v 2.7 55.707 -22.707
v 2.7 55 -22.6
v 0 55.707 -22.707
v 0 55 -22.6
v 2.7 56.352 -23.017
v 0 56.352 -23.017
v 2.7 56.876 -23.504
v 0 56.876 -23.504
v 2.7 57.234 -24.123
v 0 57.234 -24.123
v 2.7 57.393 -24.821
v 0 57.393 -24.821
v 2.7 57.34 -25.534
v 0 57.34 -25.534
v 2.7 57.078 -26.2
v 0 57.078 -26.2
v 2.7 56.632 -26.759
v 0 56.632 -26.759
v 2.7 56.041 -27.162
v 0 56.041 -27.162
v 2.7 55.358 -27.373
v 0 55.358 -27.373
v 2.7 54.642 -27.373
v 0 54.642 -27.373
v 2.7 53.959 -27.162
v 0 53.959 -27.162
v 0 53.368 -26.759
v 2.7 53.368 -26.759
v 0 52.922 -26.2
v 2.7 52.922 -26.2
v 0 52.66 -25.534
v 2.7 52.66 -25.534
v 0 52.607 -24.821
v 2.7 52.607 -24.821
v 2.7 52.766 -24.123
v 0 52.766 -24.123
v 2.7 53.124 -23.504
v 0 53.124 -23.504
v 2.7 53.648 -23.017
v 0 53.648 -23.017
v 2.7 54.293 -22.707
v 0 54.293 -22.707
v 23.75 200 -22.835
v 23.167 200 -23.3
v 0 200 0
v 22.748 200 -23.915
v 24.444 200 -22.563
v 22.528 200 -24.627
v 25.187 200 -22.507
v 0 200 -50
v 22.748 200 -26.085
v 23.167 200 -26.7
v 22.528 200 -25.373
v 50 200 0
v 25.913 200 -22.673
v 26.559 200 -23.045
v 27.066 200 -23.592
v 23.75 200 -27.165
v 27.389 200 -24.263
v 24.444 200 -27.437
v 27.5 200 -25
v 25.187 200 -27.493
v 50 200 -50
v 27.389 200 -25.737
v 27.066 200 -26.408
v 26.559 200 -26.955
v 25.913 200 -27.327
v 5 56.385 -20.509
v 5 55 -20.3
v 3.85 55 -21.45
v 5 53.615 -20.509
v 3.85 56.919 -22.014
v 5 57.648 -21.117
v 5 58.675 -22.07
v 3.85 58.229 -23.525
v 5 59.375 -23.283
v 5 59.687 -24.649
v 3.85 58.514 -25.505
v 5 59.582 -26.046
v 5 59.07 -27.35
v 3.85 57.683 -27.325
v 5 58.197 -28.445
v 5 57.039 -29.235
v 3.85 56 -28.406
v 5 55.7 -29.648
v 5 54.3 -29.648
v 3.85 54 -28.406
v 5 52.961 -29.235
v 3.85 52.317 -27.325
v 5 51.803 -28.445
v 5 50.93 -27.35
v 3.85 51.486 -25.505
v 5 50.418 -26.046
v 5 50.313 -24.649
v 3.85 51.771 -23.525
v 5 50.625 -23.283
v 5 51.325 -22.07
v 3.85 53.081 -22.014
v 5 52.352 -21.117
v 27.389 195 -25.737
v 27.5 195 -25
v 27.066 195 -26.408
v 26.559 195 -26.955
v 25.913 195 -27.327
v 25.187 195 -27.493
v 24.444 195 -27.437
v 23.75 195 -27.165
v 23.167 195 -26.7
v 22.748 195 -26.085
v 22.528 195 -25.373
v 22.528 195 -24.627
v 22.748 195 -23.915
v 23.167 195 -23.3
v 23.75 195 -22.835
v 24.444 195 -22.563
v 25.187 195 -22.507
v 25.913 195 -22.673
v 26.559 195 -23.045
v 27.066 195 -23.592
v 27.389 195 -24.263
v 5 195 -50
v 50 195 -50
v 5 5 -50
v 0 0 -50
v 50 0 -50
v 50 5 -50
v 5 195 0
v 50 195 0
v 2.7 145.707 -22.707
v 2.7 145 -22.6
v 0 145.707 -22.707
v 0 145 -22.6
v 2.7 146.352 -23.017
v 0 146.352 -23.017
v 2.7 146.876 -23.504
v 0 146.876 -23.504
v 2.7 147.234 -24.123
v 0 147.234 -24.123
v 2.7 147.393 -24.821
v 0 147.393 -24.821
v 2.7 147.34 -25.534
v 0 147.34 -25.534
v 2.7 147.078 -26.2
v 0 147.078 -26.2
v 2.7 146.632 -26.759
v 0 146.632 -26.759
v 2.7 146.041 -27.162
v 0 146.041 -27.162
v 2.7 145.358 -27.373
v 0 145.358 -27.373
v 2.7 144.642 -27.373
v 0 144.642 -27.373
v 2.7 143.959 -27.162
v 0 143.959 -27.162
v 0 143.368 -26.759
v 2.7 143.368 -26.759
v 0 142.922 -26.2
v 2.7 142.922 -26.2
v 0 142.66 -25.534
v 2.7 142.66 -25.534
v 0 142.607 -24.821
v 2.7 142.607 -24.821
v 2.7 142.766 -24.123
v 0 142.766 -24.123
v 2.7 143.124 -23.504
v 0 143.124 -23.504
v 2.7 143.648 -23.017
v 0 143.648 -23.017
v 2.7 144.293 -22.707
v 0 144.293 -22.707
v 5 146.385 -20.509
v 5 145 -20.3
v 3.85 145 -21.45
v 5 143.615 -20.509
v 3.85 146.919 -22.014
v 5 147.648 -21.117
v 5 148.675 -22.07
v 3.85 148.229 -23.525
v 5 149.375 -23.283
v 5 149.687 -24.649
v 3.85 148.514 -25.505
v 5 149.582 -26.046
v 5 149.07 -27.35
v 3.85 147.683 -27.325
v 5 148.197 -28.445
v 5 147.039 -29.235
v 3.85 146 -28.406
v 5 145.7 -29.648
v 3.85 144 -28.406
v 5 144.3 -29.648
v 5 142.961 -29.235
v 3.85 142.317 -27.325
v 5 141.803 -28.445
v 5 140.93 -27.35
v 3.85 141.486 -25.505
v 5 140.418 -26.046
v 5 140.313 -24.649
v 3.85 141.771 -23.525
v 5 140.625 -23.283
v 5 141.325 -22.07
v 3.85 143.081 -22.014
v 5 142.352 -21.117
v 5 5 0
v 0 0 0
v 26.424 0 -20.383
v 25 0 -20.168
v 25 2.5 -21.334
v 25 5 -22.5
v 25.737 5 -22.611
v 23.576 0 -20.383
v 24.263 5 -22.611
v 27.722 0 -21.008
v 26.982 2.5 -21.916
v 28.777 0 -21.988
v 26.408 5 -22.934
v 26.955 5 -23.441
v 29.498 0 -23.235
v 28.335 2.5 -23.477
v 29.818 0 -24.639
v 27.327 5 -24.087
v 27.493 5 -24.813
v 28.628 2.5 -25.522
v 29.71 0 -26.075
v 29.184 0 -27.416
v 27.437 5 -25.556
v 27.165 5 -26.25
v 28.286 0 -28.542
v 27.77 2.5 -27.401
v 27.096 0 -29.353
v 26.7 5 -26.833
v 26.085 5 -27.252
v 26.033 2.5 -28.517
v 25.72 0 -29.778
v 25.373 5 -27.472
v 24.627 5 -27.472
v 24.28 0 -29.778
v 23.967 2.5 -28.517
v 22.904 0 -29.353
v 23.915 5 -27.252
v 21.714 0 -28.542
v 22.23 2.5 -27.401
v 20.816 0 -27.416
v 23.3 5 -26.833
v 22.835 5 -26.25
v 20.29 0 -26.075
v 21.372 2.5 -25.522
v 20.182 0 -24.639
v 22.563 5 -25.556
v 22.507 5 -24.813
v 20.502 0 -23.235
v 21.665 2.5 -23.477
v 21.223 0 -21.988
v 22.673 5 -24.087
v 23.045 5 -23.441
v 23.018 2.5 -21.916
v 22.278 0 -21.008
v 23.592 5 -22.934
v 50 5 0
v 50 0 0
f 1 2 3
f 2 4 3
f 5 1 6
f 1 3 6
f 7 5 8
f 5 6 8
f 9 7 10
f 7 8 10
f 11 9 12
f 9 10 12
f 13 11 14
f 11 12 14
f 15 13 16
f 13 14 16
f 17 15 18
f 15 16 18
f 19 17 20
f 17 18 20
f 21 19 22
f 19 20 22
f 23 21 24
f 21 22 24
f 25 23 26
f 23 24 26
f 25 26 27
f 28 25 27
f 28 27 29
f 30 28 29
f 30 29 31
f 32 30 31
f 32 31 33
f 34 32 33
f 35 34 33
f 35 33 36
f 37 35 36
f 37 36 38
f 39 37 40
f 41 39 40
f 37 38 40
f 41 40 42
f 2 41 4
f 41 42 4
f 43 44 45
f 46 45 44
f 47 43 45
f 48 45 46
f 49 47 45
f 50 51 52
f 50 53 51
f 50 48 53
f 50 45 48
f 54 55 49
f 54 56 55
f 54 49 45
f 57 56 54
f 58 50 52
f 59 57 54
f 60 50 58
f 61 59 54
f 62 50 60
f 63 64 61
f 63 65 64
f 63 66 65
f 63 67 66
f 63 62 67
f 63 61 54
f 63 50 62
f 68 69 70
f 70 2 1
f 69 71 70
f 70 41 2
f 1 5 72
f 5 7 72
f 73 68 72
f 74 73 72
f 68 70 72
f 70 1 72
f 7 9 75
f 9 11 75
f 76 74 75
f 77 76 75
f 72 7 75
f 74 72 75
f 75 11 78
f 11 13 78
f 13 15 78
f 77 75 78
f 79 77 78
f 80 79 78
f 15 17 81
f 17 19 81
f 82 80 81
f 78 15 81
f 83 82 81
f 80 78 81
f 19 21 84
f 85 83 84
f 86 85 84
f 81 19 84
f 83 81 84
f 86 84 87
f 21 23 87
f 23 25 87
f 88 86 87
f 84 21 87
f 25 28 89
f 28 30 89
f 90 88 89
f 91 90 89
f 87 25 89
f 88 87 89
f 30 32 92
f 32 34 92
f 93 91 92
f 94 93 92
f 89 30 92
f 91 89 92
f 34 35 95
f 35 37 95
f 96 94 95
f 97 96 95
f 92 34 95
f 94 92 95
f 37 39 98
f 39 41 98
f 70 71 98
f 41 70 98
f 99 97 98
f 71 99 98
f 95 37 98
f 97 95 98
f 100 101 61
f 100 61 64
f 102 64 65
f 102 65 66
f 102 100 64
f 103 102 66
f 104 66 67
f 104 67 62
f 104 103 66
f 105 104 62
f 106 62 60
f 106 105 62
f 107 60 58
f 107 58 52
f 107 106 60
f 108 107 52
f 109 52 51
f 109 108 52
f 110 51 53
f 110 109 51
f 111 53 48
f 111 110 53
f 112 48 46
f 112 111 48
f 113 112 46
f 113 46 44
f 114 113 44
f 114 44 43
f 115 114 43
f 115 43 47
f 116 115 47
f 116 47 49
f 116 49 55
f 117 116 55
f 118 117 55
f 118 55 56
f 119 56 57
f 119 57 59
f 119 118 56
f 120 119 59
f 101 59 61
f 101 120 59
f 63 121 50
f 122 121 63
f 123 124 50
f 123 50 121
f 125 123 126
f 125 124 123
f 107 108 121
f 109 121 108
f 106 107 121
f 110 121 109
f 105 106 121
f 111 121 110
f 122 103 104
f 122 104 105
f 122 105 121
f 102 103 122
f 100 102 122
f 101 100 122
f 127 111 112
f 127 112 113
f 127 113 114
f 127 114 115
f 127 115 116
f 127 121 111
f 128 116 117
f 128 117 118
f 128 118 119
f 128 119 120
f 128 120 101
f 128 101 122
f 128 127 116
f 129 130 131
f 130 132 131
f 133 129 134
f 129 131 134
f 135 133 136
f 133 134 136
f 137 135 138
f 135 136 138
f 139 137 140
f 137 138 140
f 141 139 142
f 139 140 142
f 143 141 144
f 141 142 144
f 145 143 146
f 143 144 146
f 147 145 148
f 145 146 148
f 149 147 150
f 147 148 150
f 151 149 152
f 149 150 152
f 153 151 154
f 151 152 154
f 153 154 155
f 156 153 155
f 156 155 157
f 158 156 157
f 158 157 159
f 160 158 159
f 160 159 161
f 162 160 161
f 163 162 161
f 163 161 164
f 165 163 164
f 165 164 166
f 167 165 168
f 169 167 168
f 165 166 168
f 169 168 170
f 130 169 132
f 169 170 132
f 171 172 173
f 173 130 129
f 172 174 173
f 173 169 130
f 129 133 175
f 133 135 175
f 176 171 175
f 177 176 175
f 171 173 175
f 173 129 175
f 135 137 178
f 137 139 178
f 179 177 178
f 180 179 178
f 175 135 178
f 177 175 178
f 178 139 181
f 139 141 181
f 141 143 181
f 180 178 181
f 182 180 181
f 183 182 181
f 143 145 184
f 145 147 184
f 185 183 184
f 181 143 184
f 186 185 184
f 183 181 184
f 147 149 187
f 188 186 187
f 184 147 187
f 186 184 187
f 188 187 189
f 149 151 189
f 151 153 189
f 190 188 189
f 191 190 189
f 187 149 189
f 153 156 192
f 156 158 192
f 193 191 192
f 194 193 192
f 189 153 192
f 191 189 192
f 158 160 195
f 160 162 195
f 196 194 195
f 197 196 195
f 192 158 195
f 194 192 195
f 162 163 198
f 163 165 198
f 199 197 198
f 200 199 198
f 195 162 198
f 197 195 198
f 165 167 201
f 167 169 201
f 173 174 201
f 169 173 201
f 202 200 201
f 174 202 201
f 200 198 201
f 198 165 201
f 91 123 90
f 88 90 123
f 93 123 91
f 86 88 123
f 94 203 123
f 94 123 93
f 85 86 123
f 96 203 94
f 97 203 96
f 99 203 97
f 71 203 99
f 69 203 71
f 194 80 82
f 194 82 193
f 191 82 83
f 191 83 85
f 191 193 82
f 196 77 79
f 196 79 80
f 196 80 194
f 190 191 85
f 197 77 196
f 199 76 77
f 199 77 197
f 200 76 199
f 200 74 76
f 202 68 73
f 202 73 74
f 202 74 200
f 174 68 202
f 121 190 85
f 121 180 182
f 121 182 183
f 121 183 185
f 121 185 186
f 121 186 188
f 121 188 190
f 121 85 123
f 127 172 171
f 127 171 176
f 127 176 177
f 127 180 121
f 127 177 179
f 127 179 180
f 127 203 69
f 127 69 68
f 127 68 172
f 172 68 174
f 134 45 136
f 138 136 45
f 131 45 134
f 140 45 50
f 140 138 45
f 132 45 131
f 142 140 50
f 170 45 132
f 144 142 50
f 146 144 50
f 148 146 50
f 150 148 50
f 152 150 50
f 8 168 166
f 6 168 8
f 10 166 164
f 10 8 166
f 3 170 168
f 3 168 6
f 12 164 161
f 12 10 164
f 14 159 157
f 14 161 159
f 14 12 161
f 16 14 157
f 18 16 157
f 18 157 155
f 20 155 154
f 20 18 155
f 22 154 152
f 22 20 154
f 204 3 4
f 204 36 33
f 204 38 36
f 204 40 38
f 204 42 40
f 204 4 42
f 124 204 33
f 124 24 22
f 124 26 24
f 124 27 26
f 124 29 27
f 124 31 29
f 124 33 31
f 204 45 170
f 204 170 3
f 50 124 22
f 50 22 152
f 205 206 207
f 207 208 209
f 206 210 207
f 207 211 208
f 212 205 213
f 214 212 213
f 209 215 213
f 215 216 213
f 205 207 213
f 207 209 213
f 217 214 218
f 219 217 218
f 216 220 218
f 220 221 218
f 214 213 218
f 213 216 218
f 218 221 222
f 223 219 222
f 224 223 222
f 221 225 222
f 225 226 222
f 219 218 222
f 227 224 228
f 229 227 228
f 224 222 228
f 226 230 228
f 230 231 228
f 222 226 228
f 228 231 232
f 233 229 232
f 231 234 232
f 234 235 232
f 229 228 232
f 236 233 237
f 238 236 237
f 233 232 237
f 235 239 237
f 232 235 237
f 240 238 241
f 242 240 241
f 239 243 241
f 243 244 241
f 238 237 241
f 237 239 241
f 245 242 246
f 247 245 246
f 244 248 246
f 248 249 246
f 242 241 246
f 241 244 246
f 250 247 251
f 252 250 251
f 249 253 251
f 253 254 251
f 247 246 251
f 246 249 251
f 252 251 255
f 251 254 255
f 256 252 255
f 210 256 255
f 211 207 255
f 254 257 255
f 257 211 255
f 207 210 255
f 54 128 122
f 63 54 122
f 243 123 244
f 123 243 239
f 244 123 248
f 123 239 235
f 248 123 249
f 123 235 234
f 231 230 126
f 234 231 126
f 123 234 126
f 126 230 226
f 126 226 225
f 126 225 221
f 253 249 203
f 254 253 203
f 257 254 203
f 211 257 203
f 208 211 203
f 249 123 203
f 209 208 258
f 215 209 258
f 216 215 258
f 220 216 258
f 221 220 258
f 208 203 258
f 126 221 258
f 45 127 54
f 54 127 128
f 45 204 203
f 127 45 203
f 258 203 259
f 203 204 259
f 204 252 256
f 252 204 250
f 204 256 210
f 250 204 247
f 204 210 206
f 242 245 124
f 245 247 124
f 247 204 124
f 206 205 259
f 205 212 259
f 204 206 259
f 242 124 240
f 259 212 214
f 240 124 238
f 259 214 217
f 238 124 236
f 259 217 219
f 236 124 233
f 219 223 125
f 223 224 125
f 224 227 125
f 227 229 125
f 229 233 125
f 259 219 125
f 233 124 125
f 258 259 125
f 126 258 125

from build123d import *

# Parameters (mm, degrees)
SKETCH1_W                                           = 50
SKETCH1_H                                           = 50
BOSS_EXTRUDE1_DEPTH                                 = 200
SKETCH2_W                                           = 45
SKETCH2_H                                           = 190
CUT_EXTRUDE1_DEPTH                                  = 50
HOLE1_START                                         = 195
HOLE1_OUTLINE_R                                     = 2.5
HOLE1_DEPTH                                         = 5
SKETCH12_R                                          = 2.5
CUT_EXTRUDE2_DEPTH                                  = 5
CUT_EXTRUDE2_DRAFT                                  = 25
CSK_FOR_M4_COUNTERSUNK_FLAT_HEAD_SCREW1_D           = 4.8
CSK_FOR_M4_COUNTERSUNK_FLAT_HEAD_SCREW1_CSINK_D     = 9.4
CSK_FOR_M4_COUNTERSUNK_FLAT_HEAD_SCREW1_CSINK_ANGLE = 90


# Read off the part's stored shape, not the designer's step: Hole1
with BuildPart() as part:
    # Sketch1 → Boss-Extrude1 (new body)
    with BuildSketch(Plane(origin=(0, 0, 0), x_dir=(1, 0, 0), z_dir=(0, 1, 0))):
        with Locations((25, 25)):
            Rectangle(SKETCH1_W, SKETCH1_H)
    extrude(amount=BOSS_EXTRUDE1_DEPTH)

    # Sketch2 → Cut-Extrude1 (cut)
    with BuildSketch(Plane.XY):
        with Locations((27.5, 100)):
            Rectangle(SKETCH2_W, SKETCH2_H)
    extrude(amount=-CUT_EXTRUDE1_DEPTH, mode=Mode.SUBTRACT)

    # Hole1 outline → Hole1 (cut)
    with BuildSketch(Plane(origin=(0, 0, 0), x_dir=(1, 0, 0), z_dir=(0, 1, 0)).offset(HOLE1_START)):
        with Locations((25, 25)):
            Circle(HOLE1_OUTLINE_R)
    extrude(amount=HOLE1_DEPTH, mode=Mode.SUBTRACT)


with BuildPart() as cut_extrude2_tool:
    # Sketch12 → Cut-Extrude2 (with draft: the straight prism first)
    with BuildSketch(Plane(origin=(0, 5, 0), x_dir=(1, 0, 0), z_dir=(0, 1, 0))):
        with Locations(Location((25, 25, 0), (0, 0, 270))):
            Circle(SKETCH12_R)
    extrude(amount=-CUT_EXTRUDE2_DEPTH)
    # Cut-Extrude2: the draft: its side faces are tilted about the plane it starts from
    cut_extrude2_sides = [cut_extrude2_tool.faces().sort_by_distance(p)[0] for p in [
        (25, 2.5, -27.5),
    ]]
    draft(cut_extrude2_sides, Plane(origin=(0, 5, 0), x_dir=(1, 0, 0), z_dir=(0, 1, 0)), CUT_EXTRUDE2_DRAFT)


with BuildPart() as part_1:
    add(part.part)

    # Cut-Extrude2: cut by cut_extrude2_tool
    add(cut_extrude2_tool.part, mode=Mode.SUBTRACT)

    # CSK for M4 Countersunk Flat Head Screw1 (through all)
    with Locations(Plane(origin=(5, 0, 0), x_dir=(0, 0, -1), z_dir=(1, 0, 0))):
        with Locations((25, 145), (25, 55)):
            CounterSinkHole(CSK_FOR_M4_COUNTERSUNK_FLAT_HEAD_SCREW1_D / 2, CSK_FOR_M4_COUNTERSUNK_FLAT_HEAD_SCREW1_CSINK_D / 2, counter_sink_angle=CSK_FOR_M4_COUNTERSUNK_FLAT_HEAD_SCREW1_CSINK_ANGLE)


solid = part_1.part
